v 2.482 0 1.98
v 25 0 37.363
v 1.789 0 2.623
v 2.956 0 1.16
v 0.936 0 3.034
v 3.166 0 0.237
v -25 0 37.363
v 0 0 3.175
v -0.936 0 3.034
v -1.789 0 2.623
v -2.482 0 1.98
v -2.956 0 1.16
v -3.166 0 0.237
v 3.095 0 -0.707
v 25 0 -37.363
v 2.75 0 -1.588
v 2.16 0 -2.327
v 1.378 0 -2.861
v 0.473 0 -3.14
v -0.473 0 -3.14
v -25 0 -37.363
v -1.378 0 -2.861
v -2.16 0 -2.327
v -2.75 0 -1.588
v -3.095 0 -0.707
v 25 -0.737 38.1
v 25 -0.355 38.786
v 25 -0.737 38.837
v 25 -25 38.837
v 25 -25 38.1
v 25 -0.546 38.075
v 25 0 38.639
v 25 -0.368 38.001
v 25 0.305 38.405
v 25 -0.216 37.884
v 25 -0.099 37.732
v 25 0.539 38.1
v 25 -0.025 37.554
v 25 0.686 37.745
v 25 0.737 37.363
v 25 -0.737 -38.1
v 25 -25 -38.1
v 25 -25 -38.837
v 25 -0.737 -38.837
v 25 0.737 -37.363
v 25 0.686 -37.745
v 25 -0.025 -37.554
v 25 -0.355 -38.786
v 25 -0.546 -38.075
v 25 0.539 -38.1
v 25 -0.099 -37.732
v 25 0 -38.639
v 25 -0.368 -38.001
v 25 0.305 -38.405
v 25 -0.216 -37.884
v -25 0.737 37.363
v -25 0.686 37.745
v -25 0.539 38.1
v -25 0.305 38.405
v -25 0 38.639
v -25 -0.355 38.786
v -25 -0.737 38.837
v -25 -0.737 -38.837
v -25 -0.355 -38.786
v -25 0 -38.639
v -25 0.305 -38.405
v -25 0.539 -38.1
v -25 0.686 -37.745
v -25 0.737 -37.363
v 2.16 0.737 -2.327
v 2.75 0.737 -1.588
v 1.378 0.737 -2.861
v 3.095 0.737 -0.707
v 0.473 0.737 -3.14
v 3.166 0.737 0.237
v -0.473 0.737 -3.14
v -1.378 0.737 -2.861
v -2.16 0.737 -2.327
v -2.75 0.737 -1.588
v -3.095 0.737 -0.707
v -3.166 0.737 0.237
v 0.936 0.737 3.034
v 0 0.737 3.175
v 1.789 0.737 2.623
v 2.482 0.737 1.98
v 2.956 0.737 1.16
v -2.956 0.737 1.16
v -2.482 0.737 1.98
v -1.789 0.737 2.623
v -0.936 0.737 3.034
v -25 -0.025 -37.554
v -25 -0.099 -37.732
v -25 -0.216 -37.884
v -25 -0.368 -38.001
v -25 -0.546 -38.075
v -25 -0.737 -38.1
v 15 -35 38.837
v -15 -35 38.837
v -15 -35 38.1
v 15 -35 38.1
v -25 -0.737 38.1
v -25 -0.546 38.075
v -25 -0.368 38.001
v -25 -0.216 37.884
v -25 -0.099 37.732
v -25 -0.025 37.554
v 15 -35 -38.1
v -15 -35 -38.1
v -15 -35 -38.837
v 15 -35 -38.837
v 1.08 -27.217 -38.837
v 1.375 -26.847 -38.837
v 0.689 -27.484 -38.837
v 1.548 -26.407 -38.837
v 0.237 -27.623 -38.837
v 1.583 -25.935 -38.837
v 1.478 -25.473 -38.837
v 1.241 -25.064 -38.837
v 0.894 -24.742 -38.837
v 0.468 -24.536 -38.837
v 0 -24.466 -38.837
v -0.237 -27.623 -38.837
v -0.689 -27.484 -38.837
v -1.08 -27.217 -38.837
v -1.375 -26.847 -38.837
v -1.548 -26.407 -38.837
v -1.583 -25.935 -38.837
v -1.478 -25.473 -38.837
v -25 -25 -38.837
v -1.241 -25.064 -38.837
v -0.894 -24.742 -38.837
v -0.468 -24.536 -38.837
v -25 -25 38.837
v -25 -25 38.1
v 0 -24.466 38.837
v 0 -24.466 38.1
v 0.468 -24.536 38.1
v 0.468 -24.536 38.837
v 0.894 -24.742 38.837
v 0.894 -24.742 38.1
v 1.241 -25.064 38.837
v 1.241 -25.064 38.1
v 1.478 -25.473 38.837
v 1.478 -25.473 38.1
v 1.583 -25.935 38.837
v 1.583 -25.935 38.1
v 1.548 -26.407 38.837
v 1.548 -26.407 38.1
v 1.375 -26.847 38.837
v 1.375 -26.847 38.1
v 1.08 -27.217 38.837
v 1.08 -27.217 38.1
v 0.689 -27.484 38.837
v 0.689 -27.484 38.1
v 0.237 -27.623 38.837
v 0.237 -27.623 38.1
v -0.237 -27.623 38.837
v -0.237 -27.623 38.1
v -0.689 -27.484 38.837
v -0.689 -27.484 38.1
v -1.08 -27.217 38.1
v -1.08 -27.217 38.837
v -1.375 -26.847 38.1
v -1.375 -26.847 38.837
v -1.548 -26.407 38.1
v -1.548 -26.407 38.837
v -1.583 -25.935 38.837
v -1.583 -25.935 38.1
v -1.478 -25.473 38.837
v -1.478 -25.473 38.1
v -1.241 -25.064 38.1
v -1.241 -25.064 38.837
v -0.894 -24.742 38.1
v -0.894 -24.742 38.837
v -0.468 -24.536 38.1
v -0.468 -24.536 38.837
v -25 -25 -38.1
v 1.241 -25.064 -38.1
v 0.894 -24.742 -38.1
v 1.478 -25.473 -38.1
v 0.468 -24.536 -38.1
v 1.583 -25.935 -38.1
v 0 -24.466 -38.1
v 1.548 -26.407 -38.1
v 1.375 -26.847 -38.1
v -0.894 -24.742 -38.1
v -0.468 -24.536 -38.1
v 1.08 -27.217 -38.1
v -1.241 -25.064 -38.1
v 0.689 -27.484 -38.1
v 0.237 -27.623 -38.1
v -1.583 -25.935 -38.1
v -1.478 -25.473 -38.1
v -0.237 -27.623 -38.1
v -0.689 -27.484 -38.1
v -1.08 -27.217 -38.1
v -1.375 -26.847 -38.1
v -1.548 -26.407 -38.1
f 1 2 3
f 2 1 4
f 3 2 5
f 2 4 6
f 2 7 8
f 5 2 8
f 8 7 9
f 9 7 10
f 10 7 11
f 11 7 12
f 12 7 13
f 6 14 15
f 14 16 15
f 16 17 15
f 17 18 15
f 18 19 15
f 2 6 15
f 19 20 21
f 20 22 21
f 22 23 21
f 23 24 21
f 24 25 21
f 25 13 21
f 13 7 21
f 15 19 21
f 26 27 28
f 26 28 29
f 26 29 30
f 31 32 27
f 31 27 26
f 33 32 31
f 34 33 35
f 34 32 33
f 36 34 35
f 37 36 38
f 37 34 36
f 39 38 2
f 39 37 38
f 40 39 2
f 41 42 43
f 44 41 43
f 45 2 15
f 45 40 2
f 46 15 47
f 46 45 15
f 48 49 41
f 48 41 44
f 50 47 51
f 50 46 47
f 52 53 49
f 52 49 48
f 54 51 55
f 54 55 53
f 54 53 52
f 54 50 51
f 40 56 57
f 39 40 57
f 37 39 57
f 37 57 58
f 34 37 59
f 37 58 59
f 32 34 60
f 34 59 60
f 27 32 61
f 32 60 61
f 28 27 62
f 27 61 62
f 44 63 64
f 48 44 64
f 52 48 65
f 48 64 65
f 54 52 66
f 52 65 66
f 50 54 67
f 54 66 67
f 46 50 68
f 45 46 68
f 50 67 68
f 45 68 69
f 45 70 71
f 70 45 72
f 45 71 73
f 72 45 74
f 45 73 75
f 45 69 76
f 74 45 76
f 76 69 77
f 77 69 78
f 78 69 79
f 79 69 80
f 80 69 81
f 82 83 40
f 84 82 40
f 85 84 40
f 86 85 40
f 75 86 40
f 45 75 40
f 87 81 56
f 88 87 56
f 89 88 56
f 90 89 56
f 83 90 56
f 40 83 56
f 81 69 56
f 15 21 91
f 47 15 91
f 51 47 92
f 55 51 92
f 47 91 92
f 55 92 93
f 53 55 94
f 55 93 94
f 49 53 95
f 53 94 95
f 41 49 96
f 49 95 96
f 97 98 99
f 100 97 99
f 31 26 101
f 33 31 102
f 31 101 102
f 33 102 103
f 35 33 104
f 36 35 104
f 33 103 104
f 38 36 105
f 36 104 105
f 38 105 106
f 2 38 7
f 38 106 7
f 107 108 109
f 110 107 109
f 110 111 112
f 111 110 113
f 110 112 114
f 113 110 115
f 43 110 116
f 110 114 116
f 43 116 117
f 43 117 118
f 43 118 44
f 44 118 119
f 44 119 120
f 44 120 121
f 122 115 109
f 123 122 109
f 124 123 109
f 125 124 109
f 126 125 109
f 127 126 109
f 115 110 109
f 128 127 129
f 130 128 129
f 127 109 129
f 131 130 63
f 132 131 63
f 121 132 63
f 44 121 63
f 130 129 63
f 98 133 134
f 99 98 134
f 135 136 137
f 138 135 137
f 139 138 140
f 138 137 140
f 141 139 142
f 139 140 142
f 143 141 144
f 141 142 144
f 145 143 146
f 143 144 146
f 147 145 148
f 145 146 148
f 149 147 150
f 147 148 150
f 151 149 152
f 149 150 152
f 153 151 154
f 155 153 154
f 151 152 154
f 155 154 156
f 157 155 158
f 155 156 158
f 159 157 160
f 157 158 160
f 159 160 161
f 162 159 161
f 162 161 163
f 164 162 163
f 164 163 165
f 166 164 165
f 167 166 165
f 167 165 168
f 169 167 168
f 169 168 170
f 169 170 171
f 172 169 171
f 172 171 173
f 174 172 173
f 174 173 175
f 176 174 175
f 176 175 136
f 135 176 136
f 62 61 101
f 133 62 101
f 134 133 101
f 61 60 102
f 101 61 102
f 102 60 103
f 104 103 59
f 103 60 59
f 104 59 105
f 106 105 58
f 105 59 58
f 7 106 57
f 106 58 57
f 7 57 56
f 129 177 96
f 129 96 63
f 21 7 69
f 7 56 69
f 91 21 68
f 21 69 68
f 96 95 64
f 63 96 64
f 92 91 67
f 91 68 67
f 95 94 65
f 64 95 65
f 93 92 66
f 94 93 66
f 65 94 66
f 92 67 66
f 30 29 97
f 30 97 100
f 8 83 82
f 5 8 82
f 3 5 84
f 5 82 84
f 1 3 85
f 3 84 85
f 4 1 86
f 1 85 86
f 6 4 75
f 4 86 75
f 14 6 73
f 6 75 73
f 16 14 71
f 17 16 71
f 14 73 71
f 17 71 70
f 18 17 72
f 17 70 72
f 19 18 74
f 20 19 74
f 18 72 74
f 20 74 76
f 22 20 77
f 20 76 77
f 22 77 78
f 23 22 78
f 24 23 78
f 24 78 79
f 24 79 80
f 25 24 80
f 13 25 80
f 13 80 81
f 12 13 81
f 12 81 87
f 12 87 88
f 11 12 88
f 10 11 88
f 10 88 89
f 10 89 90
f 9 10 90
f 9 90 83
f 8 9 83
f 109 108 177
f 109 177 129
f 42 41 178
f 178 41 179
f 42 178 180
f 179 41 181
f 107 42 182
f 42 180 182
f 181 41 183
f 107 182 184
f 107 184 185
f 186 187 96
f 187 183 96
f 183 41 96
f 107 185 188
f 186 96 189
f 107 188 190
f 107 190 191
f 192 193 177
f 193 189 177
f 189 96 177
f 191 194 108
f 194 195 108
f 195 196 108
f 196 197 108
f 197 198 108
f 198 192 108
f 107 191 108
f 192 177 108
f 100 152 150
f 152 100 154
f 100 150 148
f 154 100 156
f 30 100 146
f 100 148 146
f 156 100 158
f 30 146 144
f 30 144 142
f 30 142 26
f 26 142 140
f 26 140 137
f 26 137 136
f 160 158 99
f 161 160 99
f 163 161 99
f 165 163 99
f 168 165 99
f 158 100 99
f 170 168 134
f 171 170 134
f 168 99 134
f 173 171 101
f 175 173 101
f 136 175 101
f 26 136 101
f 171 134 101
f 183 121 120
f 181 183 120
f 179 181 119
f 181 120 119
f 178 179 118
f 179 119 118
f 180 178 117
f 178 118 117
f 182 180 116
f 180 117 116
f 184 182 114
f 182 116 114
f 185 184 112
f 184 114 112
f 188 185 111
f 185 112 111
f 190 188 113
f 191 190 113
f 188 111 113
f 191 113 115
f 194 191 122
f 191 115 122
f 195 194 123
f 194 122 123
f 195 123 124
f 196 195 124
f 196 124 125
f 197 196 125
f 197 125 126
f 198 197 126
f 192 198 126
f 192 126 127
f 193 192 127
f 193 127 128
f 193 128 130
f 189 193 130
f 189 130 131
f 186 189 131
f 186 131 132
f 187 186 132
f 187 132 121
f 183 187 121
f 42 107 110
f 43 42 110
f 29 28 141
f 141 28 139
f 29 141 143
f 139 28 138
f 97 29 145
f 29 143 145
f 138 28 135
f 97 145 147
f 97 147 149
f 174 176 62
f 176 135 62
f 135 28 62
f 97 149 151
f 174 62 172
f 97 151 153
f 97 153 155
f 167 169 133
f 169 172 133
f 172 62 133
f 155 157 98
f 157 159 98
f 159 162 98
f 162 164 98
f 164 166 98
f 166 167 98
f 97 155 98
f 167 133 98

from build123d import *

# Parameters (mm, degrees)
BASE_FLANGE1_DEPTH      = 25
BASE_FLANGE1_DEPTH_BACK = 25
SKETCH6_R               = 1.5875
CUT_EXTRUDE1_DEPTH      = 89.786969755
SKETCH7_R               = 3.175
CUT_EXTRUDE2_DEPTH      = 10
CHAMFER1_SIZE           = 10


# Sheet-metal steps are written as plain solids
with BuildPart() as part:
    # Sketch1 → Base-Flange1 (new, two sides: drawn at the far end of the back side and taken through both)
    with BuildSketch(Plane(origin=(0, 0, 0), x_dir=(0, 0, -1), z_dir=(1, 0, 0)).offset(-BASE_FLANGE1_DEPTH_BACK)):
        with BuildLine():
            Line((-38.1, -35), (-38.1, -0.7366))
            ThreePointArc((-38.1, -0.7366), (-37.884254855, -0.215745145), (-37.3634, 0))
            Line((-37.3634, 0), (37.3634, 0))
            ThreePointArc((37.3634, 0), (37.884254855, -0.215745145), (38.1, -0.7366))
            Line((38.1, -0.7366), (38.1, -35))
            Line((38.1, -35), (38.8366, -35))
            Line((38.8366, -35), (38.8366, -0.7366))
            ThreePointArc((38.8366, -0.7366), (38.40510971, 0.30510971), (37.3634, 0.7366))
            Line((37.3634, 0.7366), (-37.3634, 0.7366))
            ThreePointArc((-37.3634, 0.7366), (-38.40510971, 0.30510971), (-38.8366, -0.7366))
            Line((-38.8366, -0.7366), (-38.8366, -35))
            Line((-38.8366, -35), (-38.1, -35))
        make_face()
    extrude(amount=BASE_FLANGE1_DEPTH + BASE_FLANGE1_DEPTH_BACK)

    # Sketch6 → Cut-Extrude1 (cut, through all)
    with BuildSketch(Plane(origin=(0, 0, -38.8366), x_dir=(-1, 0, 0), z_dir=(0, 0, -1))):
        with Locations(Location((0, -26.05331339, 0), (0, 0, 90))):
            Circle(SKETCH6_R)
    extrude(amount=-CUT_EXTRUDE1_DEPTH, mode=Mode.SUBTRACT)

    # Sketch7 → Cut-Extrude2 (cut)
    with BuildSketch(Plane(origin=(0, 0.7366, 0), x_dir=(1, 0, 0), z_dir=(0, 1, 0))):
        with Locations(Location((0, 0, 0), (0, 0, 270))):
            Circle(SKETCH7_R)
    extrude(amount=-CUT_EXTRUDE2_DEPTH, mode=Mode.SUBTRACT)

    # Chamfer1
    chamfer1_edges = [part.edges().sort_by_distance(p)[0] for p in [
        (25, -35, -38.4683),
        (-25, -35, -38.4683),
        (-25, -35, 38.4683),
        (25, -35, 38.4683),
    ]]
    chamfer(chamfer1_edges, length=CHAMFER1_SIZE)


solid = part.part
